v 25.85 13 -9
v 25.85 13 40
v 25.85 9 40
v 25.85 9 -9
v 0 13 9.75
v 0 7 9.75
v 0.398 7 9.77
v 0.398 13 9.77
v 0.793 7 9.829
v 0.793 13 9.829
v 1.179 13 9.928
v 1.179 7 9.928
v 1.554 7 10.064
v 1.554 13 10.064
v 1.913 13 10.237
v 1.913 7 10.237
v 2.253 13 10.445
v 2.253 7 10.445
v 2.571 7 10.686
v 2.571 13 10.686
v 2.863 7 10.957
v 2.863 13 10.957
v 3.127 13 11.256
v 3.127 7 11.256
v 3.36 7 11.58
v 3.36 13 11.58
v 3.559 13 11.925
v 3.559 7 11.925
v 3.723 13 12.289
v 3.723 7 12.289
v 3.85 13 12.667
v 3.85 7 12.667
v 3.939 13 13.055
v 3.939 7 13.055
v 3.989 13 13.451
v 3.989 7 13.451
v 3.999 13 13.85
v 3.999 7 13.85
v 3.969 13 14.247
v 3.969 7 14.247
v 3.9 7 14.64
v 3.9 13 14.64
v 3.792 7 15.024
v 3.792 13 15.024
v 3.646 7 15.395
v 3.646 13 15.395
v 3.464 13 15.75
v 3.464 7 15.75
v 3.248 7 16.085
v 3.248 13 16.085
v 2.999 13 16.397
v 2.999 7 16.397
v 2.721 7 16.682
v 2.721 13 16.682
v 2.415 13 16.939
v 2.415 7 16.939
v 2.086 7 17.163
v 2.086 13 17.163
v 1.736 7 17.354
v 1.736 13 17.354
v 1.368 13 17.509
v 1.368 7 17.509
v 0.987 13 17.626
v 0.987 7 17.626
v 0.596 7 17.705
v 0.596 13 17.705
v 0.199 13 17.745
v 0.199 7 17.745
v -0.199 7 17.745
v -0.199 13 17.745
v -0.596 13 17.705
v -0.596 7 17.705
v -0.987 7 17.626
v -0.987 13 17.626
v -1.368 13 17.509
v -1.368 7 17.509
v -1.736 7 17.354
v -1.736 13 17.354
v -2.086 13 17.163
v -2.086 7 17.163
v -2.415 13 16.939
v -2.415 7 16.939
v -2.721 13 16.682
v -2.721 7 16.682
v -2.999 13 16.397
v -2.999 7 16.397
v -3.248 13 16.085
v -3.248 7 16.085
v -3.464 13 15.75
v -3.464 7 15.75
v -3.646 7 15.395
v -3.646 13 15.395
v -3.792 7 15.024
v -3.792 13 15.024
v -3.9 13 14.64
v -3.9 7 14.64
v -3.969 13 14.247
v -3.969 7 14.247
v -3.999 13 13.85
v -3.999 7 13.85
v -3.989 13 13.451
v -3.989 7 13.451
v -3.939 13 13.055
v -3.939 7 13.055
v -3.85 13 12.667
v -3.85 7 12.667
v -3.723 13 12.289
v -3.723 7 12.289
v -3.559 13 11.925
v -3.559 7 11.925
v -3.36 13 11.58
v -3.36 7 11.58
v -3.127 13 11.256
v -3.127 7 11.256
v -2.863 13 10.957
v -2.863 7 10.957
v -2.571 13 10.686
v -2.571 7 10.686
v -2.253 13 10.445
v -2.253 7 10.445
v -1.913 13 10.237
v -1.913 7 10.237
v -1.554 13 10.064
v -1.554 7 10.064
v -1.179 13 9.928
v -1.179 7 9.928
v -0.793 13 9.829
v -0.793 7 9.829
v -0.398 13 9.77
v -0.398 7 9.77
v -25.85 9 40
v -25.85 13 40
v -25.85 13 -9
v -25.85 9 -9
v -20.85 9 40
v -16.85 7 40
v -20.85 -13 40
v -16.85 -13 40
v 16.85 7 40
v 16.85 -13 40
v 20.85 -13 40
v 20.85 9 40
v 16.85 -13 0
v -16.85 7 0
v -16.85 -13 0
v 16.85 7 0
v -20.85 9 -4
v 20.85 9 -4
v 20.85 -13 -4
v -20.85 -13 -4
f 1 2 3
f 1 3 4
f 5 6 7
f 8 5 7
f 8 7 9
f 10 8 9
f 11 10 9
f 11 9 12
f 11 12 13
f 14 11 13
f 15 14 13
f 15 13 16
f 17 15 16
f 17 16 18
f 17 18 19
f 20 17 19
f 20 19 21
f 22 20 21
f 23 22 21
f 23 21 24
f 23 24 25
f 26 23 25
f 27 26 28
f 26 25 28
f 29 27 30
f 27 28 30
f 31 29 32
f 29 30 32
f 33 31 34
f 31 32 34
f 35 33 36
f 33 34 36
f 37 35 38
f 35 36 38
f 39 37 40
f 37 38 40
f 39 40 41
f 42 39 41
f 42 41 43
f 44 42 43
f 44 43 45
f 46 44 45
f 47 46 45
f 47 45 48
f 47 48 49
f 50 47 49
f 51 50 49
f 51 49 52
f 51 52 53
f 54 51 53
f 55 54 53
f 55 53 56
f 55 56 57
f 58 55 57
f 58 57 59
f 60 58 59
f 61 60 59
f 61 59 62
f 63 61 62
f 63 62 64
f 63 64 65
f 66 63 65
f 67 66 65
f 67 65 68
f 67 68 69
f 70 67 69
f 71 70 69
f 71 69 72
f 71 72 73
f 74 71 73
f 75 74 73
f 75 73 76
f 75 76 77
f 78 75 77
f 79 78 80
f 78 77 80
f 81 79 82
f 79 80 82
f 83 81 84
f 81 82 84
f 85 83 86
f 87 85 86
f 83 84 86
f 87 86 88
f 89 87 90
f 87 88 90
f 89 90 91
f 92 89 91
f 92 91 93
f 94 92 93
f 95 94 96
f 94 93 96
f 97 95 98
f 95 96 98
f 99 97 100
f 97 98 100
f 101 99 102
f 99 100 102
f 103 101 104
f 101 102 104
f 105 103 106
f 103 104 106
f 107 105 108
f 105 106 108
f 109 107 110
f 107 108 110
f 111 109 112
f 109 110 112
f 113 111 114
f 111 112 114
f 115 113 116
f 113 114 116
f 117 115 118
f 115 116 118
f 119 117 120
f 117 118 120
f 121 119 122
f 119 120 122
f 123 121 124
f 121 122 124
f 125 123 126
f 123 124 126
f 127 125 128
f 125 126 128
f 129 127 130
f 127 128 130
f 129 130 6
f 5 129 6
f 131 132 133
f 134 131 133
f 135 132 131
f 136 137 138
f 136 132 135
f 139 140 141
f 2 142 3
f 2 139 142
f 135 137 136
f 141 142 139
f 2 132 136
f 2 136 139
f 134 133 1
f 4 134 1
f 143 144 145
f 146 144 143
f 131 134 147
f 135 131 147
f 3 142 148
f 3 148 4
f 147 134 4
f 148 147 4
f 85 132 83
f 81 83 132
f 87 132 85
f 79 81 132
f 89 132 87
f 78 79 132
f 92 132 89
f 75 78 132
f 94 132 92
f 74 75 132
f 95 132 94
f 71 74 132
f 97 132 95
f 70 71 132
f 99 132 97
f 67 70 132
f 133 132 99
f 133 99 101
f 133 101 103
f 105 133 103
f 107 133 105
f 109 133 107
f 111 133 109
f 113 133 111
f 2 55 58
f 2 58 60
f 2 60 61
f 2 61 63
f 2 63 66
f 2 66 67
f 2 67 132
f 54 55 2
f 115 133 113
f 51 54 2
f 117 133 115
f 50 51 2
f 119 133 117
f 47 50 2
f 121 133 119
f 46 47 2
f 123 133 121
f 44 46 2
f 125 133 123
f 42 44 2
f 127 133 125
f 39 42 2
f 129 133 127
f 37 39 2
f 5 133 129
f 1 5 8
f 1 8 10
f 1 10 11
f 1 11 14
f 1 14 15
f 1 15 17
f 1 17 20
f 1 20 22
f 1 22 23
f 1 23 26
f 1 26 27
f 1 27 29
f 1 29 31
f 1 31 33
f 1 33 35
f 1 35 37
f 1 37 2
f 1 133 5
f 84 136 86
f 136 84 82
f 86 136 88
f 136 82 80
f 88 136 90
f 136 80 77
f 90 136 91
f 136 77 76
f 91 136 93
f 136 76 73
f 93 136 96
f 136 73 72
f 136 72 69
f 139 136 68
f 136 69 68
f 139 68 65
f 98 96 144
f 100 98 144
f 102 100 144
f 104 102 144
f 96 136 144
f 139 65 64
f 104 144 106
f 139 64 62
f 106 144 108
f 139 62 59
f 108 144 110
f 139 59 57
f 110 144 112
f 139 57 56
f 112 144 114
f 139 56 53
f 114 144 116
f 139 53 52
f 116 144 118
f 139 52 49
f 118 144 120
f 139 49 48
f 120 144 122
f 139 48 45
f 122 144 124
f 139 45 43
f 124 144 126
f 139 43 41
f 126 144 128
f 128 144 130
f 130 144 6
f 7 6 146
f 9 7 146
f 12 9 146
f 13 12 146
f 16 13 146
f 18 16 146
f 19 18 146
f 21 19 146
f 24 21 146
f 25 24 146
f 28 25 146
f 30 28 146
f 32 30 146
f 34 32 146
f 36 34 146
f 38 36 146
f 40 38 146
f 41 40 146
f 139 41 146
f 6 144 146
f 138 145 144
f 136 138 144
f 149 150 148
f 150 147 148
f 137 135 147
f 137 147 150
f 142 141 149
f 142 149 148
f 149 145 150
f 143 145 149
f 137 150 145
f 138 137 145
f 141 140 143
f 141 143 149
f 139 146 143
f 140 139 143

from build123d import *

# Parameters (mm, degrees)
EXTRUDE_1_DEPTH     = 40
SKETCH_1_3_W        = 41.7
SKETCH_1_3_H        = 26
EXTRUDE_2_DEPTH     = 4
SKETCH_2_W          = 51.7
SKETCH_2_H          = 49
EXTRUDE_3_DEPTH     = 4
SKETCH_3_R          = 4
CUT_EXTRUDE_1_DEPTH = 8


with BuildPart() as part:
    # 草图1 → 凸台-拉伸1 (new body)
    with BuildSketch(Plane.XY):
        Polygon((16.85, -13), (20.85, -13), (20.85, 13), (-20.85, 13), (-20.85, -13), (-16.85, -13), (-16.85, 7), (16.85, 7), align=None)
    extrude(amount=EXTRUDE_1_DEPTH)

    # 草图1<3> → 凸台-拉伸2 (add)
    with BuildSketch(Plane.XY):
        Rectangle(SKETCH_1_3_W, SKETCH_1_3_H)
    extrude(amount=-EXTRUDE_2_DEPTH)

    # 草图2 → 凸台-拉伸3 (add)
    with BuildSketch(Plane(origin=(0, 13, 0), x_dir=(1, 0, 0), z_dir=(0, 1, 0))):
        with Locations((0, -15.5)):
            Rectangle(SKETCH_2_W, SKETCH_2_H)
    extrude(amount=-EXTRUDE_3_DEPTH)

    # 草图3 → 切除-拉伸1 (cut)
    with BuildSketch(Plane.XZ.offset(-7)):
        with Locations((0, 13.75)):
            Circle(SKETCH_3_R)
    extrude(amount=-CUT_EXTRUDE_1_DEPTH, mode=Mode.SUBTRACT)


solid = part.part
